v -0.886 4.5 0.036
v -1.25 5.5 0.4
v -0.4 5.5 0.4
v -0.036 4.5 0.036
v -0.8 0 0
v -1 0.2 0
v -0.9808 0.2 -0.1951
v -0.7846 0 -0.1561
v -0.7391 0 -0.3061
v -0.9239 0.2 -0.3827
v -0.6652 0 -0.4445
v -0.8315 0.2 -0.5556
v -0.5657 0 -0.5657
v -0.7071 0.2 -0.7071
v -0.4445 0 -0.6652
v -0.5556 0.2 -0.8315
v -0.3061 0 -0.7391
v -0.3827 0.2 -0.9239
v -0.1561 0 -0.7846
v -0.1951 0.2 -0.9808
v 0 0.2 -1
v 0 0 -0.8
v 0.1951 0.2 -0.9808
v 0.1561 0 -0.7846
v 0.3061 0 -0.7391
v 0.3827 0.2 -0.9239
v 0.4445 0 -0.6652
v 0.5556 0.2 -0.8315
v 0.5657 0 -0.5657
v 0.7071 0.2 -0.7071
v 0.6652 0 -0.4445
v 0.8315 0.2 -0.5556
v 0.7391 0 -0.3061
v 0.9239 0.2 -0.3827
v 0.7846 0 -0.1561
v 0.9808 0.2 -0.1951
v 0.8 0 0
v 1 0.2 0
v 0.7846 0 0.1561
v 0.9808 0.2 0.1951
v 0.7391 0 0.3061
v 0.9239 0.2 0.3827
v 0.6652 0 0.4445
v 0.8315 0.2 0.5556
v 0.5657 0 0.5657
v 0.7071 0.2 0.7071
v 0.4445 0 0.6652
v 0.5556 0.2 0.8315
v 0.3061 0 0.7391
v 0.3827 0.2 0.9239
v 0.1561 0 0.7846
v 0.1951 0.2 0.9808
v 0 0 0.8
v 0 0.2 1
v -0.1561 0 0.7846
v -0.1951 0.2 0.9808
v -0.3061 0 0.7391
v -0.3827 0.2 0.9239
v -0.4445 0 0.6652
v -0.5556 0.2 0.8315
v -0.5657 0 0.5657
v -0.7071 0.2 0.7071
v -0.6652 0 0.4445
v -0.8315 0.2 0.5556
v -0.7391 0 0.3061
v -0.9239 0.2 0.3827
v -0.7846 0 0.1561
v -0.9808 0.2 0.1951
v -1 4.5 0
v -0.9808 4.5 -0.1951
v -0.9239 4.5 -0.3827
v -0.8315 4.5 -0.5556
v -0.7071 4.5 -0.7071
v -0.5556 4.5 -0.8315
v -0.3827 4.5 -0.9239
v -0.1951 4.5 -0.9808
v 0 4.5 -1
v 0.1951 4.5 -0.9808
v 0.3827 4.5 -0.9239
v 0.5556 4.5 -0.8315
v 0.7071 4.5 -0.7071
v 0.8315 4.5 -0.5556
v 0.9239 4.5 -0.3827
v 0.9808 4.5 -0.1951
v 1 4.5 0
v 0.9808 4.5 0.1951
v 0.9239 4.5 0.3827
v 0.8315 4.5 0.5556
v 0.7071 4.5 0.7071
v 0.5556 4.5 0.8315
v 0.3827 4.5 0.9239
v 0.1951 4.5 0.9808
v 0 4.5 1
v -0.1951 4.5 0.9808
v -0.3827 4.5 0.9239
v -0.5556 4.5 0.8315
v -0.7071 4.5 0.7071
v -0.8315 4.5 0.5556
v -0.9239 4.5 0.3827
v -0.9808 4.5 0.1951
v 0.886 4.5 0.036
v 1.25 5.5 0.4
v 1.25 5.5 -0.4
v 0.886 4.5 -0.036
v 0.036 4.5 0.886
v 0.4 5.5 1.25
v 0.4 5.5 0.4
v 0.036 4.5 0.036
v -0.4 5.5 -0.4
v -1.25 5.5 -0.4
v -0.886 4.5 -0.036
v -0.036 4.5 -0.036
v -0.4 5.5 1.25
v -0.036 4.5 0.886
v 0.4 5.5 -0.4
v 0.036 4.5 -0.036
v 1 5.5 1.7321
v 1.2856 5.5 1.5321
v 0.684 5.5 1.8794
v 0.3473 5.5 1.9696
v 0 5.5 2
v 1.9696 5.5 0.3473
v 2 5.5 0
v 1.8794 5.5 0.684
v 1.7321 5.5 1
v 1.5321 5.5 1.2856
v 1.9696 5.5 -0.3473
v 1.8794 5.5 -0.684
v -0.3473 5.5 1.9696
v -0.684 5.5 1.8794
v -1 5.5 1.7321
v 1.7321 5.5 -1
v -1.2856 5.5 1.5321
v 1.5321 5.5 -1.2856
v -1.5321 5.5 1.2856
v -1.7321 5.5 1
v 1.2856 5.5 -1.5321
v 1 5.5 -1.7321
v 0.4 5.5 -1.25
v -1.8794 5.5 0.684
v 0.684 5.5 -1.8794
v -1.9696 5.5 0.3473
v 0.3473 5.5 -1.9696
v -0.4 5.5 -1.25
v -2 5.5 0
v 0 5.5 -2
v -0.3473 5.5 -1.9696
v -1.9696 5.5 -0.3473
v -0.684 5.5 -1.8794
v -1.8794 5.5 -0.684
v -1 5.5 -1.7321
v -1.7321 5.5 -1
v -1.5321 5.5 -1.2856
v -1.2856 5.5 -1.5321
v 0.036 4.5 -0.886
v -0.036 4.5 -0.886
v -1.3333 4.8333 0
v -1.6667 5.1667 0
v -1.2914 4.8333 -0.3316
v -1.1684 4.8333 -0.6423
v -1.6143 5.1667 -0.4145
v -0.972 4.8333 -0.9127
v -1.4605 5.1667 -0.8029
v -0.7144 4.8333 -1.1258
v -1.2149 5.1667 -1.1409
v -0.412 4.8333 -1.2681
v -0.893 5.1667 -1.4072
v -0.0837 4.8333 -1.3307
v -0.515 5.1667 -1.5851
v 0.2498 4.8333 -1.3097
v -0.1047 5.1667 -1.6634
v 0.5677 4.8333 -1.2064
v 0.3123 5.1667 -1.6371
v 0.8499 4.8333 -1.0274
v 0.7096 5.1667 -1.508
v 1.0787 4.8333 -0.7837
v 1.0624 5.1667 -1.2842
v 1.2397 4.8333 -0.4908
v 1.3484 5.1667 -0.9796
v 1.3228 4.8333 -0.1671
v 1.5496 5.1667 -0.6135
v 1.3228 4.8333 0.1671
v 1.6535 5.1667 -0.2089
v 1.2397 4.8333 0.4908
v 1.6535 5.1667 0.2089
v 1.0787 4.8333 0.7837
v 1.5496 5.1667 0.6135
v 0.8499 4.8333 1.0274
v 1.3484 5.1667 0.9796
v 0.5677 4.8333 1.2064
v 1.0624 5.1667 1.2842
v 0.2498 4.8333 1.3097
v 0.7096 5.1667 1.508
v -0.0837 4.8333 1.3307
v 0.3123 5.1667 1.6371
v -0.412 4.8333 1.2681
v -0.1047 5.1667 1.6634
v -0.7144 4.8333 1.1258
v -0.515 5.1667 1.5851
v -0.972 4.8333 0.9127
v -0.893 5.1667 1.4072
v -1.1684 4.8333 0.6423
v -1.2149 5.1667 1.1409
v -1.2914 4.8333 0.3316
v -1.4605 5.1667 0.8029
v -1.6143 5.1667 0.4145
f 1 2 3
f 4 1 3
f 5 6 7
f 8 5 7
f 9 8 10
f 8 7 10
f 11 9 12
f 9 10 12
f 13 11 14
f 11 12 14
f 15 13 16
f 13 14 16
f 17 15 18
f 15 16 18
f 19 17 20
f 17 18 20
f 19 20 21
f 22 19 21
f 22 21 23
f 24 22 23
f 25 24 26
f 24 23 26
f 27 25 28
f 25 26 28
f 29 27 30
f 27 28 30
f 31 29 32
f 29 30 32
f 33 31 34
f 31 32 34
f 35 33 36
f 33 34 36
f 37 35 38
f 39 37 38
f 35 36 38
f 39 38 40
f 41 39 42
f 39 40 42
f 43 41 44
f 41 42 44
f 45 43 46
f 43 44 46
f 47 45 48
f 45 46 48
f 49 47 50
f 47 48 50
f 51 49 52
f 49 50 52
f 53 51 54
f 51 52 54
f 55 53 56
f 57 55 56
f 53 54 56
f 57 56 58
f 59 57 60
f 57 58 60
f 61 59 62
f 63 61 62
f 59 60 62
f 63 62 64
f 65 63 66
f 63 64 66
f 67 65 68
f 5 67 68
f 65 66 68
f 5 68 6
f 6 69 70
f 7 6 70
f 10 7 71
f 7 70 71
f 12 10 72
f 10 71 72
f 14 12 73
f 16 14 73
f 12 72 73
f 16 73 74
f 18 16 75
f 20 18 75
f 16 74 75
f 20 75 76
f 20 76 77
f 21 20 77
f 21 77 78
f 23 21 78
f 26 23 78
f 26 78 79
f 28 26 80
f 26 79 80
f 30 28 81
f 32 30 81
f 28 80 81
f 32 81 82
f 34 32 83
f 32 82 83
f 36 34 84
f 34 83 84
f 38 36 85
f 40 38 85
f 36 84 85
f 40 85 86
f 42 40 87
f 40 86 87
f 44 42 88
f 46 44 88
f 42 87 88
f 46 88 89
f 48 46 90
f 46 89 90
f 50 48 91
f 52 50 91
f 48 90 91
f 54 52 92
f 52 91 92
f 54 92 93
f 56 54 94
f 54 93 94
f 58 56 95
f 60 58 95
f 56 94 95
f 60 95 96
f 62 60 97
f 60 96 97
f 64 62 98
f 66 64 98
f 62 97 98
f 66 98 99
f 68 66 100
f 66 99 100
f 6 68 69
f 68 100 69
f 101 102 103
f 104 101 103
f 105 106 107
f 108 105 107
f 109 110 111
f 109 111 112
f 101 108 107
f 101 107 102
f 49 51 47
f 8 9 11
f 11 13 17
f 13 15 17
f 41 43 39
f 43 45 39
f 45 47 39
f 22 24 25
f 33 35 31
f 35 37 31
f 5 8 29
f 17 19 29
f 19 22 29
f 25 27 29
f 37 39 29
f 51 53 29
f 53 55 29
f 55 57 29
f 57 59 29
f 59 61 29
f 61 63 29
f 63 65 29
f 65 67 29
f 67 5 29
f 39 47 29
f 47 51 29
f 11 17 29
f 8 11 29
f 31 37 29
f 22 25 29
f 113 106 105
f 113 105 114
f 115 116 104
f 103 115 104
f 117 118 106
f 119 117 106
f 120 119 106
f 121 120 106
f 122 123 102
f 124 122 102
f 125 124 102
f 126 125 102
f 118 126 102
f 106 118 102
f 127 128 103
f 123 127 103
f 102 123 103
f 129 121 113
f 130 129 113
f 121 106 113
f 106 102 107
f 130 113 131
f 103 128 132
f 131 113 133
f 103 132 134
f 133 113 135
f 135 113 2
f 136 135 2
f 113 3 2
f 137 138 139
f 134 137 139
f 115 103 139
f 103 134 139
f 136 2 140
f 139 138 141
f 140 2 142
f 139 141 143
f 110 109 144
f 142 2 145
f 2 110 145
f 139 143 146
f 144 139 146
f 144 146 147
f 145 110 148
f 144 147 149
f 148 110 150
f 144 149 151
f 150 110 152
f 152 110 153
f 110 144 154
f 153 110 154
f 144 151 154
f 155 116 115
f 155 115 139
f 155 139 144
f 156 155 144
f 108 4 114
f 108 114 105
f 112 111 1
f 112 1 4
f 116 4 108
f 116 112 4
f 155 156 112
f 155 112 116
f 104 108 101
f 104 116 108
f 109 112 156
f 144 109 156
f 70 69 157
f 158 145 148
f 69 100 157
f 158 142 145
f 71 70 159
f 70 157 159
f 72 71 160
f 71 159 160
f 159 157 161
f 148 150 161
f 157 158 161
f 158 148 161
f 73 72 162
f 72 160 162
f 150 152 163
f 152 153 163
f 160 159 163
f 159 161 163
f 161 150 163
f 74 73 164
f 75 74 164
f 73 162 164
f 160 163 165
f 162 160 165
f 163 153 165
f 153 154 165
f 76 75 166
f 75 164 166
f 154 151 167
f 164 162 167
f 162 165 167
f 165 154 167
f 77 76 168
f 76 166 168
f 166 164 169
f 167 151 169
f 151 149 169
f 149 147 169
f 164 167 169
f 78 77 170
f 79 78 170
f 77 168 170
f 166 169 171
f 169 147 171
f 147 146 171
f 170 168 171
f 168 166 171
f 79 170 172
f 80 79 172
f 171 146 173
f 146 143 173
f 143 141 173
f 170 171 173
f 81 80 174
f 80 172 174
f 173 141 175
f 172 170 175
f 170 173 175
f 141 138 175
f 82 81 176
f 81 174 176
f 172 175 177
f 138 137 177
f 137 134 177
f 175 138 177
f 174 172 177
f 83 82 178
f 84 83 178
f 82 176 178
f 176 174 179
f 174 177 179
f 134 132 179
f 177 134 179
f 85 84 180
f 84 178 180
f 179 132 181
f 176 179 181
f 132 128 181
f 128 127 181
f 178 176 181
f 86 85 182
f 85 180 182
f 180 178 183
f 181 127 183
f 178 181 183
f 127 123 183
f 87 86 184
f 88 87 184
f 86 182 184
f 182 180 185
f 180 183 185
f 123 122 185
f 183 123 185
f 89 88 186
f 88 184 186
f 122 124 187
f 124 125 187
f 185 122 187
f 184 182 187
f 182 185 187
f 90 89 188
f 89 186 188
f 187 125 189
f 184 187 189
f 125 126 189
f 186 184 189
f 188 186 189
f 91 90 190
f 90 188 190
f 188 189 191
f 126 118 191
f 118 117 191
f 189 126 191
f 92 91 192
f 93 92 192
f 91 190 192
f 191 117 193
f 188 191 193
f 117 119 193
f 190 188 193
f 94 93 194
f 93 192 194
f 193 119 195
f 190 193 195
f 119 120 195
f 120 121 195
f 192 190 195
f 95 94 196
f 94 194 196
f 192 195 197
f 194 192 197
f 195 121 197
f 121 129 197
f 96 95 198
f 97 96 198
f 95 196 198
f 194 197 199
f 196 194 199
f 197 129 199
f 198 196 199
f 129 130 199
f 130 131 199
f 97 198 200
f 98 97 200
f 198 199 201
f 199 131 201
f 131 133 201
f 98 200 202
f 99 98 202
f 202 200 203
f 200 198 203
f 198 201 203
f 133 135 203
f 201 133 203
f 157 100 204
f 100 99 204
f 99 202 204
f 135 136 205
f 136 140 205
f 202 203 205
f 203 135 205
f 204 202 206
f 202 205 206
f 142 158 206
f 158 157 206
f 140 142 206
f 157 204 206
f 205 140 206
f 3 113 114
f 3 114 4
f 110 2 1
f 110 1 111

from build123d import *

# Parameters (mm, degrees)
CHAMFER1_SIZE               = 0.2
SKETCH2_W                   = 2.5
SKETCH2_H                   = 0.8
CUT_EXTRUDE1_DEPTH          = 1
CUT_EXTRUDE1_DRAFT          = -20
CIRPATTERN1_COPY_1_SKETCH_W = 2.5
CIRPATTERN1_COPY_1_SKETCH_H = 0.8
CIRPATTERN1_COPY_1_DEPTH    = 1
CIRPATTERN1_COPY_1_DRAFT    = -20


with BuildPart() as part:
    # Sketch1 → Revolve1 (revolve)
    with BuildSketch(Plane.XY):
        Polygon((0, 0), (1, 0), (1, 4.5), (2, 5.5), (0, 5.5), align=None)
    revolve(axis=Axis((0, 5.5, 0), (0, -1, 0)))

    # Chamfer1
    chamfer1_edges = [part.edges().sort_by_distance(p)[0] for p in [
        (-1, 0, 0),
    ]]
    chamfer(chamfer1_edges, length=CHAMFER1_SIZE)


with BuildPart() as cut_extrude1_tool:
    # Sketch2 → Cut-Extrude1 (with draft: the straight prism first)
    with BuildSketch(Plane(origin=(0, 5.5, 0), x_dir=(1, 0, 0), z_dir=(0, 1, 0))):
        Rectangle(SKETCH2_W, SKETCH2_H)
    extrude(amount=-CUT_EXTRUDE1_DEPTH)
    # Cut-Extrude1: the draft: its side faces are tilted about the plane it starts from
    cut_extrude1_sides = [cut_extrude1_tool.faces().sort_by_distance(p)[0] for p in [
        (0, 5, 0.4),
        (1.25, 5, 0),
        (0, 5, -0.4),
        (-1.25, 5, 0),
    ]]
    draft(cut_extrude1_sides, Plane(origin=(0, 5.5, 0), x_dir=(1, 0, 0), z_dir=(0, 1, 0)), CUT_EXTRUDE1_DRAFT)


with BuildPart() as part_1:
    add(part.part)

    # Cut-Extrude1: cut by cut_extrude1_tool
    add(cut_extrude1_tool.part, mode=Mode.SUBTRACT)


with BuildPart() as cirpattern1_copy_1_tool:
    # CirPattern1 copy 1 sketch → CirPattern1 copy 1 (with draft: the straight prism first)
    with BuildSketch(Plane(origin=(0, 5.5, 0), x_dir=(0, 0, -1), z_dir=(0, 1, 0))):
        Rectangle(CIRPATTERN1_COPY_1_SKETCH_W, CIRPATTERN1_COPY_1_SKETCH_H)
    extrude(amount=-CIRPATTERN1_COPY_1_DEPTH)
    # CirPattern1 copy 1: the draft: its side faces are tilted about the plane it starts from
    cirpattern1_copy_1_sides = [cirpattern1_copy_1_tool.faces().sort_by_distance(p)[0] for p in [
        (0.4, 5, 0),
        (0, 5, -1.25),
        (-0.4, 5, 0),
        (0, 5, 1.25),
    ]]
    draft(cirpattern1_copy_1_sides, Plane(origin=(0, 5.5, 0), x_dir=(0, 0, -1), z_dir=(0, 1, 0)), CIRPATTERN1_COPY_1_DRAFT)


with BuildPart() as part_2:
    add(part_1.part)

    # CirPattern1 copy 1: cut by cirpattern1_copy_1_tool
    add(cirpattern1_copy_1_tool.part, mode=Mode.SUBTRACT)


solid = part_2.part
